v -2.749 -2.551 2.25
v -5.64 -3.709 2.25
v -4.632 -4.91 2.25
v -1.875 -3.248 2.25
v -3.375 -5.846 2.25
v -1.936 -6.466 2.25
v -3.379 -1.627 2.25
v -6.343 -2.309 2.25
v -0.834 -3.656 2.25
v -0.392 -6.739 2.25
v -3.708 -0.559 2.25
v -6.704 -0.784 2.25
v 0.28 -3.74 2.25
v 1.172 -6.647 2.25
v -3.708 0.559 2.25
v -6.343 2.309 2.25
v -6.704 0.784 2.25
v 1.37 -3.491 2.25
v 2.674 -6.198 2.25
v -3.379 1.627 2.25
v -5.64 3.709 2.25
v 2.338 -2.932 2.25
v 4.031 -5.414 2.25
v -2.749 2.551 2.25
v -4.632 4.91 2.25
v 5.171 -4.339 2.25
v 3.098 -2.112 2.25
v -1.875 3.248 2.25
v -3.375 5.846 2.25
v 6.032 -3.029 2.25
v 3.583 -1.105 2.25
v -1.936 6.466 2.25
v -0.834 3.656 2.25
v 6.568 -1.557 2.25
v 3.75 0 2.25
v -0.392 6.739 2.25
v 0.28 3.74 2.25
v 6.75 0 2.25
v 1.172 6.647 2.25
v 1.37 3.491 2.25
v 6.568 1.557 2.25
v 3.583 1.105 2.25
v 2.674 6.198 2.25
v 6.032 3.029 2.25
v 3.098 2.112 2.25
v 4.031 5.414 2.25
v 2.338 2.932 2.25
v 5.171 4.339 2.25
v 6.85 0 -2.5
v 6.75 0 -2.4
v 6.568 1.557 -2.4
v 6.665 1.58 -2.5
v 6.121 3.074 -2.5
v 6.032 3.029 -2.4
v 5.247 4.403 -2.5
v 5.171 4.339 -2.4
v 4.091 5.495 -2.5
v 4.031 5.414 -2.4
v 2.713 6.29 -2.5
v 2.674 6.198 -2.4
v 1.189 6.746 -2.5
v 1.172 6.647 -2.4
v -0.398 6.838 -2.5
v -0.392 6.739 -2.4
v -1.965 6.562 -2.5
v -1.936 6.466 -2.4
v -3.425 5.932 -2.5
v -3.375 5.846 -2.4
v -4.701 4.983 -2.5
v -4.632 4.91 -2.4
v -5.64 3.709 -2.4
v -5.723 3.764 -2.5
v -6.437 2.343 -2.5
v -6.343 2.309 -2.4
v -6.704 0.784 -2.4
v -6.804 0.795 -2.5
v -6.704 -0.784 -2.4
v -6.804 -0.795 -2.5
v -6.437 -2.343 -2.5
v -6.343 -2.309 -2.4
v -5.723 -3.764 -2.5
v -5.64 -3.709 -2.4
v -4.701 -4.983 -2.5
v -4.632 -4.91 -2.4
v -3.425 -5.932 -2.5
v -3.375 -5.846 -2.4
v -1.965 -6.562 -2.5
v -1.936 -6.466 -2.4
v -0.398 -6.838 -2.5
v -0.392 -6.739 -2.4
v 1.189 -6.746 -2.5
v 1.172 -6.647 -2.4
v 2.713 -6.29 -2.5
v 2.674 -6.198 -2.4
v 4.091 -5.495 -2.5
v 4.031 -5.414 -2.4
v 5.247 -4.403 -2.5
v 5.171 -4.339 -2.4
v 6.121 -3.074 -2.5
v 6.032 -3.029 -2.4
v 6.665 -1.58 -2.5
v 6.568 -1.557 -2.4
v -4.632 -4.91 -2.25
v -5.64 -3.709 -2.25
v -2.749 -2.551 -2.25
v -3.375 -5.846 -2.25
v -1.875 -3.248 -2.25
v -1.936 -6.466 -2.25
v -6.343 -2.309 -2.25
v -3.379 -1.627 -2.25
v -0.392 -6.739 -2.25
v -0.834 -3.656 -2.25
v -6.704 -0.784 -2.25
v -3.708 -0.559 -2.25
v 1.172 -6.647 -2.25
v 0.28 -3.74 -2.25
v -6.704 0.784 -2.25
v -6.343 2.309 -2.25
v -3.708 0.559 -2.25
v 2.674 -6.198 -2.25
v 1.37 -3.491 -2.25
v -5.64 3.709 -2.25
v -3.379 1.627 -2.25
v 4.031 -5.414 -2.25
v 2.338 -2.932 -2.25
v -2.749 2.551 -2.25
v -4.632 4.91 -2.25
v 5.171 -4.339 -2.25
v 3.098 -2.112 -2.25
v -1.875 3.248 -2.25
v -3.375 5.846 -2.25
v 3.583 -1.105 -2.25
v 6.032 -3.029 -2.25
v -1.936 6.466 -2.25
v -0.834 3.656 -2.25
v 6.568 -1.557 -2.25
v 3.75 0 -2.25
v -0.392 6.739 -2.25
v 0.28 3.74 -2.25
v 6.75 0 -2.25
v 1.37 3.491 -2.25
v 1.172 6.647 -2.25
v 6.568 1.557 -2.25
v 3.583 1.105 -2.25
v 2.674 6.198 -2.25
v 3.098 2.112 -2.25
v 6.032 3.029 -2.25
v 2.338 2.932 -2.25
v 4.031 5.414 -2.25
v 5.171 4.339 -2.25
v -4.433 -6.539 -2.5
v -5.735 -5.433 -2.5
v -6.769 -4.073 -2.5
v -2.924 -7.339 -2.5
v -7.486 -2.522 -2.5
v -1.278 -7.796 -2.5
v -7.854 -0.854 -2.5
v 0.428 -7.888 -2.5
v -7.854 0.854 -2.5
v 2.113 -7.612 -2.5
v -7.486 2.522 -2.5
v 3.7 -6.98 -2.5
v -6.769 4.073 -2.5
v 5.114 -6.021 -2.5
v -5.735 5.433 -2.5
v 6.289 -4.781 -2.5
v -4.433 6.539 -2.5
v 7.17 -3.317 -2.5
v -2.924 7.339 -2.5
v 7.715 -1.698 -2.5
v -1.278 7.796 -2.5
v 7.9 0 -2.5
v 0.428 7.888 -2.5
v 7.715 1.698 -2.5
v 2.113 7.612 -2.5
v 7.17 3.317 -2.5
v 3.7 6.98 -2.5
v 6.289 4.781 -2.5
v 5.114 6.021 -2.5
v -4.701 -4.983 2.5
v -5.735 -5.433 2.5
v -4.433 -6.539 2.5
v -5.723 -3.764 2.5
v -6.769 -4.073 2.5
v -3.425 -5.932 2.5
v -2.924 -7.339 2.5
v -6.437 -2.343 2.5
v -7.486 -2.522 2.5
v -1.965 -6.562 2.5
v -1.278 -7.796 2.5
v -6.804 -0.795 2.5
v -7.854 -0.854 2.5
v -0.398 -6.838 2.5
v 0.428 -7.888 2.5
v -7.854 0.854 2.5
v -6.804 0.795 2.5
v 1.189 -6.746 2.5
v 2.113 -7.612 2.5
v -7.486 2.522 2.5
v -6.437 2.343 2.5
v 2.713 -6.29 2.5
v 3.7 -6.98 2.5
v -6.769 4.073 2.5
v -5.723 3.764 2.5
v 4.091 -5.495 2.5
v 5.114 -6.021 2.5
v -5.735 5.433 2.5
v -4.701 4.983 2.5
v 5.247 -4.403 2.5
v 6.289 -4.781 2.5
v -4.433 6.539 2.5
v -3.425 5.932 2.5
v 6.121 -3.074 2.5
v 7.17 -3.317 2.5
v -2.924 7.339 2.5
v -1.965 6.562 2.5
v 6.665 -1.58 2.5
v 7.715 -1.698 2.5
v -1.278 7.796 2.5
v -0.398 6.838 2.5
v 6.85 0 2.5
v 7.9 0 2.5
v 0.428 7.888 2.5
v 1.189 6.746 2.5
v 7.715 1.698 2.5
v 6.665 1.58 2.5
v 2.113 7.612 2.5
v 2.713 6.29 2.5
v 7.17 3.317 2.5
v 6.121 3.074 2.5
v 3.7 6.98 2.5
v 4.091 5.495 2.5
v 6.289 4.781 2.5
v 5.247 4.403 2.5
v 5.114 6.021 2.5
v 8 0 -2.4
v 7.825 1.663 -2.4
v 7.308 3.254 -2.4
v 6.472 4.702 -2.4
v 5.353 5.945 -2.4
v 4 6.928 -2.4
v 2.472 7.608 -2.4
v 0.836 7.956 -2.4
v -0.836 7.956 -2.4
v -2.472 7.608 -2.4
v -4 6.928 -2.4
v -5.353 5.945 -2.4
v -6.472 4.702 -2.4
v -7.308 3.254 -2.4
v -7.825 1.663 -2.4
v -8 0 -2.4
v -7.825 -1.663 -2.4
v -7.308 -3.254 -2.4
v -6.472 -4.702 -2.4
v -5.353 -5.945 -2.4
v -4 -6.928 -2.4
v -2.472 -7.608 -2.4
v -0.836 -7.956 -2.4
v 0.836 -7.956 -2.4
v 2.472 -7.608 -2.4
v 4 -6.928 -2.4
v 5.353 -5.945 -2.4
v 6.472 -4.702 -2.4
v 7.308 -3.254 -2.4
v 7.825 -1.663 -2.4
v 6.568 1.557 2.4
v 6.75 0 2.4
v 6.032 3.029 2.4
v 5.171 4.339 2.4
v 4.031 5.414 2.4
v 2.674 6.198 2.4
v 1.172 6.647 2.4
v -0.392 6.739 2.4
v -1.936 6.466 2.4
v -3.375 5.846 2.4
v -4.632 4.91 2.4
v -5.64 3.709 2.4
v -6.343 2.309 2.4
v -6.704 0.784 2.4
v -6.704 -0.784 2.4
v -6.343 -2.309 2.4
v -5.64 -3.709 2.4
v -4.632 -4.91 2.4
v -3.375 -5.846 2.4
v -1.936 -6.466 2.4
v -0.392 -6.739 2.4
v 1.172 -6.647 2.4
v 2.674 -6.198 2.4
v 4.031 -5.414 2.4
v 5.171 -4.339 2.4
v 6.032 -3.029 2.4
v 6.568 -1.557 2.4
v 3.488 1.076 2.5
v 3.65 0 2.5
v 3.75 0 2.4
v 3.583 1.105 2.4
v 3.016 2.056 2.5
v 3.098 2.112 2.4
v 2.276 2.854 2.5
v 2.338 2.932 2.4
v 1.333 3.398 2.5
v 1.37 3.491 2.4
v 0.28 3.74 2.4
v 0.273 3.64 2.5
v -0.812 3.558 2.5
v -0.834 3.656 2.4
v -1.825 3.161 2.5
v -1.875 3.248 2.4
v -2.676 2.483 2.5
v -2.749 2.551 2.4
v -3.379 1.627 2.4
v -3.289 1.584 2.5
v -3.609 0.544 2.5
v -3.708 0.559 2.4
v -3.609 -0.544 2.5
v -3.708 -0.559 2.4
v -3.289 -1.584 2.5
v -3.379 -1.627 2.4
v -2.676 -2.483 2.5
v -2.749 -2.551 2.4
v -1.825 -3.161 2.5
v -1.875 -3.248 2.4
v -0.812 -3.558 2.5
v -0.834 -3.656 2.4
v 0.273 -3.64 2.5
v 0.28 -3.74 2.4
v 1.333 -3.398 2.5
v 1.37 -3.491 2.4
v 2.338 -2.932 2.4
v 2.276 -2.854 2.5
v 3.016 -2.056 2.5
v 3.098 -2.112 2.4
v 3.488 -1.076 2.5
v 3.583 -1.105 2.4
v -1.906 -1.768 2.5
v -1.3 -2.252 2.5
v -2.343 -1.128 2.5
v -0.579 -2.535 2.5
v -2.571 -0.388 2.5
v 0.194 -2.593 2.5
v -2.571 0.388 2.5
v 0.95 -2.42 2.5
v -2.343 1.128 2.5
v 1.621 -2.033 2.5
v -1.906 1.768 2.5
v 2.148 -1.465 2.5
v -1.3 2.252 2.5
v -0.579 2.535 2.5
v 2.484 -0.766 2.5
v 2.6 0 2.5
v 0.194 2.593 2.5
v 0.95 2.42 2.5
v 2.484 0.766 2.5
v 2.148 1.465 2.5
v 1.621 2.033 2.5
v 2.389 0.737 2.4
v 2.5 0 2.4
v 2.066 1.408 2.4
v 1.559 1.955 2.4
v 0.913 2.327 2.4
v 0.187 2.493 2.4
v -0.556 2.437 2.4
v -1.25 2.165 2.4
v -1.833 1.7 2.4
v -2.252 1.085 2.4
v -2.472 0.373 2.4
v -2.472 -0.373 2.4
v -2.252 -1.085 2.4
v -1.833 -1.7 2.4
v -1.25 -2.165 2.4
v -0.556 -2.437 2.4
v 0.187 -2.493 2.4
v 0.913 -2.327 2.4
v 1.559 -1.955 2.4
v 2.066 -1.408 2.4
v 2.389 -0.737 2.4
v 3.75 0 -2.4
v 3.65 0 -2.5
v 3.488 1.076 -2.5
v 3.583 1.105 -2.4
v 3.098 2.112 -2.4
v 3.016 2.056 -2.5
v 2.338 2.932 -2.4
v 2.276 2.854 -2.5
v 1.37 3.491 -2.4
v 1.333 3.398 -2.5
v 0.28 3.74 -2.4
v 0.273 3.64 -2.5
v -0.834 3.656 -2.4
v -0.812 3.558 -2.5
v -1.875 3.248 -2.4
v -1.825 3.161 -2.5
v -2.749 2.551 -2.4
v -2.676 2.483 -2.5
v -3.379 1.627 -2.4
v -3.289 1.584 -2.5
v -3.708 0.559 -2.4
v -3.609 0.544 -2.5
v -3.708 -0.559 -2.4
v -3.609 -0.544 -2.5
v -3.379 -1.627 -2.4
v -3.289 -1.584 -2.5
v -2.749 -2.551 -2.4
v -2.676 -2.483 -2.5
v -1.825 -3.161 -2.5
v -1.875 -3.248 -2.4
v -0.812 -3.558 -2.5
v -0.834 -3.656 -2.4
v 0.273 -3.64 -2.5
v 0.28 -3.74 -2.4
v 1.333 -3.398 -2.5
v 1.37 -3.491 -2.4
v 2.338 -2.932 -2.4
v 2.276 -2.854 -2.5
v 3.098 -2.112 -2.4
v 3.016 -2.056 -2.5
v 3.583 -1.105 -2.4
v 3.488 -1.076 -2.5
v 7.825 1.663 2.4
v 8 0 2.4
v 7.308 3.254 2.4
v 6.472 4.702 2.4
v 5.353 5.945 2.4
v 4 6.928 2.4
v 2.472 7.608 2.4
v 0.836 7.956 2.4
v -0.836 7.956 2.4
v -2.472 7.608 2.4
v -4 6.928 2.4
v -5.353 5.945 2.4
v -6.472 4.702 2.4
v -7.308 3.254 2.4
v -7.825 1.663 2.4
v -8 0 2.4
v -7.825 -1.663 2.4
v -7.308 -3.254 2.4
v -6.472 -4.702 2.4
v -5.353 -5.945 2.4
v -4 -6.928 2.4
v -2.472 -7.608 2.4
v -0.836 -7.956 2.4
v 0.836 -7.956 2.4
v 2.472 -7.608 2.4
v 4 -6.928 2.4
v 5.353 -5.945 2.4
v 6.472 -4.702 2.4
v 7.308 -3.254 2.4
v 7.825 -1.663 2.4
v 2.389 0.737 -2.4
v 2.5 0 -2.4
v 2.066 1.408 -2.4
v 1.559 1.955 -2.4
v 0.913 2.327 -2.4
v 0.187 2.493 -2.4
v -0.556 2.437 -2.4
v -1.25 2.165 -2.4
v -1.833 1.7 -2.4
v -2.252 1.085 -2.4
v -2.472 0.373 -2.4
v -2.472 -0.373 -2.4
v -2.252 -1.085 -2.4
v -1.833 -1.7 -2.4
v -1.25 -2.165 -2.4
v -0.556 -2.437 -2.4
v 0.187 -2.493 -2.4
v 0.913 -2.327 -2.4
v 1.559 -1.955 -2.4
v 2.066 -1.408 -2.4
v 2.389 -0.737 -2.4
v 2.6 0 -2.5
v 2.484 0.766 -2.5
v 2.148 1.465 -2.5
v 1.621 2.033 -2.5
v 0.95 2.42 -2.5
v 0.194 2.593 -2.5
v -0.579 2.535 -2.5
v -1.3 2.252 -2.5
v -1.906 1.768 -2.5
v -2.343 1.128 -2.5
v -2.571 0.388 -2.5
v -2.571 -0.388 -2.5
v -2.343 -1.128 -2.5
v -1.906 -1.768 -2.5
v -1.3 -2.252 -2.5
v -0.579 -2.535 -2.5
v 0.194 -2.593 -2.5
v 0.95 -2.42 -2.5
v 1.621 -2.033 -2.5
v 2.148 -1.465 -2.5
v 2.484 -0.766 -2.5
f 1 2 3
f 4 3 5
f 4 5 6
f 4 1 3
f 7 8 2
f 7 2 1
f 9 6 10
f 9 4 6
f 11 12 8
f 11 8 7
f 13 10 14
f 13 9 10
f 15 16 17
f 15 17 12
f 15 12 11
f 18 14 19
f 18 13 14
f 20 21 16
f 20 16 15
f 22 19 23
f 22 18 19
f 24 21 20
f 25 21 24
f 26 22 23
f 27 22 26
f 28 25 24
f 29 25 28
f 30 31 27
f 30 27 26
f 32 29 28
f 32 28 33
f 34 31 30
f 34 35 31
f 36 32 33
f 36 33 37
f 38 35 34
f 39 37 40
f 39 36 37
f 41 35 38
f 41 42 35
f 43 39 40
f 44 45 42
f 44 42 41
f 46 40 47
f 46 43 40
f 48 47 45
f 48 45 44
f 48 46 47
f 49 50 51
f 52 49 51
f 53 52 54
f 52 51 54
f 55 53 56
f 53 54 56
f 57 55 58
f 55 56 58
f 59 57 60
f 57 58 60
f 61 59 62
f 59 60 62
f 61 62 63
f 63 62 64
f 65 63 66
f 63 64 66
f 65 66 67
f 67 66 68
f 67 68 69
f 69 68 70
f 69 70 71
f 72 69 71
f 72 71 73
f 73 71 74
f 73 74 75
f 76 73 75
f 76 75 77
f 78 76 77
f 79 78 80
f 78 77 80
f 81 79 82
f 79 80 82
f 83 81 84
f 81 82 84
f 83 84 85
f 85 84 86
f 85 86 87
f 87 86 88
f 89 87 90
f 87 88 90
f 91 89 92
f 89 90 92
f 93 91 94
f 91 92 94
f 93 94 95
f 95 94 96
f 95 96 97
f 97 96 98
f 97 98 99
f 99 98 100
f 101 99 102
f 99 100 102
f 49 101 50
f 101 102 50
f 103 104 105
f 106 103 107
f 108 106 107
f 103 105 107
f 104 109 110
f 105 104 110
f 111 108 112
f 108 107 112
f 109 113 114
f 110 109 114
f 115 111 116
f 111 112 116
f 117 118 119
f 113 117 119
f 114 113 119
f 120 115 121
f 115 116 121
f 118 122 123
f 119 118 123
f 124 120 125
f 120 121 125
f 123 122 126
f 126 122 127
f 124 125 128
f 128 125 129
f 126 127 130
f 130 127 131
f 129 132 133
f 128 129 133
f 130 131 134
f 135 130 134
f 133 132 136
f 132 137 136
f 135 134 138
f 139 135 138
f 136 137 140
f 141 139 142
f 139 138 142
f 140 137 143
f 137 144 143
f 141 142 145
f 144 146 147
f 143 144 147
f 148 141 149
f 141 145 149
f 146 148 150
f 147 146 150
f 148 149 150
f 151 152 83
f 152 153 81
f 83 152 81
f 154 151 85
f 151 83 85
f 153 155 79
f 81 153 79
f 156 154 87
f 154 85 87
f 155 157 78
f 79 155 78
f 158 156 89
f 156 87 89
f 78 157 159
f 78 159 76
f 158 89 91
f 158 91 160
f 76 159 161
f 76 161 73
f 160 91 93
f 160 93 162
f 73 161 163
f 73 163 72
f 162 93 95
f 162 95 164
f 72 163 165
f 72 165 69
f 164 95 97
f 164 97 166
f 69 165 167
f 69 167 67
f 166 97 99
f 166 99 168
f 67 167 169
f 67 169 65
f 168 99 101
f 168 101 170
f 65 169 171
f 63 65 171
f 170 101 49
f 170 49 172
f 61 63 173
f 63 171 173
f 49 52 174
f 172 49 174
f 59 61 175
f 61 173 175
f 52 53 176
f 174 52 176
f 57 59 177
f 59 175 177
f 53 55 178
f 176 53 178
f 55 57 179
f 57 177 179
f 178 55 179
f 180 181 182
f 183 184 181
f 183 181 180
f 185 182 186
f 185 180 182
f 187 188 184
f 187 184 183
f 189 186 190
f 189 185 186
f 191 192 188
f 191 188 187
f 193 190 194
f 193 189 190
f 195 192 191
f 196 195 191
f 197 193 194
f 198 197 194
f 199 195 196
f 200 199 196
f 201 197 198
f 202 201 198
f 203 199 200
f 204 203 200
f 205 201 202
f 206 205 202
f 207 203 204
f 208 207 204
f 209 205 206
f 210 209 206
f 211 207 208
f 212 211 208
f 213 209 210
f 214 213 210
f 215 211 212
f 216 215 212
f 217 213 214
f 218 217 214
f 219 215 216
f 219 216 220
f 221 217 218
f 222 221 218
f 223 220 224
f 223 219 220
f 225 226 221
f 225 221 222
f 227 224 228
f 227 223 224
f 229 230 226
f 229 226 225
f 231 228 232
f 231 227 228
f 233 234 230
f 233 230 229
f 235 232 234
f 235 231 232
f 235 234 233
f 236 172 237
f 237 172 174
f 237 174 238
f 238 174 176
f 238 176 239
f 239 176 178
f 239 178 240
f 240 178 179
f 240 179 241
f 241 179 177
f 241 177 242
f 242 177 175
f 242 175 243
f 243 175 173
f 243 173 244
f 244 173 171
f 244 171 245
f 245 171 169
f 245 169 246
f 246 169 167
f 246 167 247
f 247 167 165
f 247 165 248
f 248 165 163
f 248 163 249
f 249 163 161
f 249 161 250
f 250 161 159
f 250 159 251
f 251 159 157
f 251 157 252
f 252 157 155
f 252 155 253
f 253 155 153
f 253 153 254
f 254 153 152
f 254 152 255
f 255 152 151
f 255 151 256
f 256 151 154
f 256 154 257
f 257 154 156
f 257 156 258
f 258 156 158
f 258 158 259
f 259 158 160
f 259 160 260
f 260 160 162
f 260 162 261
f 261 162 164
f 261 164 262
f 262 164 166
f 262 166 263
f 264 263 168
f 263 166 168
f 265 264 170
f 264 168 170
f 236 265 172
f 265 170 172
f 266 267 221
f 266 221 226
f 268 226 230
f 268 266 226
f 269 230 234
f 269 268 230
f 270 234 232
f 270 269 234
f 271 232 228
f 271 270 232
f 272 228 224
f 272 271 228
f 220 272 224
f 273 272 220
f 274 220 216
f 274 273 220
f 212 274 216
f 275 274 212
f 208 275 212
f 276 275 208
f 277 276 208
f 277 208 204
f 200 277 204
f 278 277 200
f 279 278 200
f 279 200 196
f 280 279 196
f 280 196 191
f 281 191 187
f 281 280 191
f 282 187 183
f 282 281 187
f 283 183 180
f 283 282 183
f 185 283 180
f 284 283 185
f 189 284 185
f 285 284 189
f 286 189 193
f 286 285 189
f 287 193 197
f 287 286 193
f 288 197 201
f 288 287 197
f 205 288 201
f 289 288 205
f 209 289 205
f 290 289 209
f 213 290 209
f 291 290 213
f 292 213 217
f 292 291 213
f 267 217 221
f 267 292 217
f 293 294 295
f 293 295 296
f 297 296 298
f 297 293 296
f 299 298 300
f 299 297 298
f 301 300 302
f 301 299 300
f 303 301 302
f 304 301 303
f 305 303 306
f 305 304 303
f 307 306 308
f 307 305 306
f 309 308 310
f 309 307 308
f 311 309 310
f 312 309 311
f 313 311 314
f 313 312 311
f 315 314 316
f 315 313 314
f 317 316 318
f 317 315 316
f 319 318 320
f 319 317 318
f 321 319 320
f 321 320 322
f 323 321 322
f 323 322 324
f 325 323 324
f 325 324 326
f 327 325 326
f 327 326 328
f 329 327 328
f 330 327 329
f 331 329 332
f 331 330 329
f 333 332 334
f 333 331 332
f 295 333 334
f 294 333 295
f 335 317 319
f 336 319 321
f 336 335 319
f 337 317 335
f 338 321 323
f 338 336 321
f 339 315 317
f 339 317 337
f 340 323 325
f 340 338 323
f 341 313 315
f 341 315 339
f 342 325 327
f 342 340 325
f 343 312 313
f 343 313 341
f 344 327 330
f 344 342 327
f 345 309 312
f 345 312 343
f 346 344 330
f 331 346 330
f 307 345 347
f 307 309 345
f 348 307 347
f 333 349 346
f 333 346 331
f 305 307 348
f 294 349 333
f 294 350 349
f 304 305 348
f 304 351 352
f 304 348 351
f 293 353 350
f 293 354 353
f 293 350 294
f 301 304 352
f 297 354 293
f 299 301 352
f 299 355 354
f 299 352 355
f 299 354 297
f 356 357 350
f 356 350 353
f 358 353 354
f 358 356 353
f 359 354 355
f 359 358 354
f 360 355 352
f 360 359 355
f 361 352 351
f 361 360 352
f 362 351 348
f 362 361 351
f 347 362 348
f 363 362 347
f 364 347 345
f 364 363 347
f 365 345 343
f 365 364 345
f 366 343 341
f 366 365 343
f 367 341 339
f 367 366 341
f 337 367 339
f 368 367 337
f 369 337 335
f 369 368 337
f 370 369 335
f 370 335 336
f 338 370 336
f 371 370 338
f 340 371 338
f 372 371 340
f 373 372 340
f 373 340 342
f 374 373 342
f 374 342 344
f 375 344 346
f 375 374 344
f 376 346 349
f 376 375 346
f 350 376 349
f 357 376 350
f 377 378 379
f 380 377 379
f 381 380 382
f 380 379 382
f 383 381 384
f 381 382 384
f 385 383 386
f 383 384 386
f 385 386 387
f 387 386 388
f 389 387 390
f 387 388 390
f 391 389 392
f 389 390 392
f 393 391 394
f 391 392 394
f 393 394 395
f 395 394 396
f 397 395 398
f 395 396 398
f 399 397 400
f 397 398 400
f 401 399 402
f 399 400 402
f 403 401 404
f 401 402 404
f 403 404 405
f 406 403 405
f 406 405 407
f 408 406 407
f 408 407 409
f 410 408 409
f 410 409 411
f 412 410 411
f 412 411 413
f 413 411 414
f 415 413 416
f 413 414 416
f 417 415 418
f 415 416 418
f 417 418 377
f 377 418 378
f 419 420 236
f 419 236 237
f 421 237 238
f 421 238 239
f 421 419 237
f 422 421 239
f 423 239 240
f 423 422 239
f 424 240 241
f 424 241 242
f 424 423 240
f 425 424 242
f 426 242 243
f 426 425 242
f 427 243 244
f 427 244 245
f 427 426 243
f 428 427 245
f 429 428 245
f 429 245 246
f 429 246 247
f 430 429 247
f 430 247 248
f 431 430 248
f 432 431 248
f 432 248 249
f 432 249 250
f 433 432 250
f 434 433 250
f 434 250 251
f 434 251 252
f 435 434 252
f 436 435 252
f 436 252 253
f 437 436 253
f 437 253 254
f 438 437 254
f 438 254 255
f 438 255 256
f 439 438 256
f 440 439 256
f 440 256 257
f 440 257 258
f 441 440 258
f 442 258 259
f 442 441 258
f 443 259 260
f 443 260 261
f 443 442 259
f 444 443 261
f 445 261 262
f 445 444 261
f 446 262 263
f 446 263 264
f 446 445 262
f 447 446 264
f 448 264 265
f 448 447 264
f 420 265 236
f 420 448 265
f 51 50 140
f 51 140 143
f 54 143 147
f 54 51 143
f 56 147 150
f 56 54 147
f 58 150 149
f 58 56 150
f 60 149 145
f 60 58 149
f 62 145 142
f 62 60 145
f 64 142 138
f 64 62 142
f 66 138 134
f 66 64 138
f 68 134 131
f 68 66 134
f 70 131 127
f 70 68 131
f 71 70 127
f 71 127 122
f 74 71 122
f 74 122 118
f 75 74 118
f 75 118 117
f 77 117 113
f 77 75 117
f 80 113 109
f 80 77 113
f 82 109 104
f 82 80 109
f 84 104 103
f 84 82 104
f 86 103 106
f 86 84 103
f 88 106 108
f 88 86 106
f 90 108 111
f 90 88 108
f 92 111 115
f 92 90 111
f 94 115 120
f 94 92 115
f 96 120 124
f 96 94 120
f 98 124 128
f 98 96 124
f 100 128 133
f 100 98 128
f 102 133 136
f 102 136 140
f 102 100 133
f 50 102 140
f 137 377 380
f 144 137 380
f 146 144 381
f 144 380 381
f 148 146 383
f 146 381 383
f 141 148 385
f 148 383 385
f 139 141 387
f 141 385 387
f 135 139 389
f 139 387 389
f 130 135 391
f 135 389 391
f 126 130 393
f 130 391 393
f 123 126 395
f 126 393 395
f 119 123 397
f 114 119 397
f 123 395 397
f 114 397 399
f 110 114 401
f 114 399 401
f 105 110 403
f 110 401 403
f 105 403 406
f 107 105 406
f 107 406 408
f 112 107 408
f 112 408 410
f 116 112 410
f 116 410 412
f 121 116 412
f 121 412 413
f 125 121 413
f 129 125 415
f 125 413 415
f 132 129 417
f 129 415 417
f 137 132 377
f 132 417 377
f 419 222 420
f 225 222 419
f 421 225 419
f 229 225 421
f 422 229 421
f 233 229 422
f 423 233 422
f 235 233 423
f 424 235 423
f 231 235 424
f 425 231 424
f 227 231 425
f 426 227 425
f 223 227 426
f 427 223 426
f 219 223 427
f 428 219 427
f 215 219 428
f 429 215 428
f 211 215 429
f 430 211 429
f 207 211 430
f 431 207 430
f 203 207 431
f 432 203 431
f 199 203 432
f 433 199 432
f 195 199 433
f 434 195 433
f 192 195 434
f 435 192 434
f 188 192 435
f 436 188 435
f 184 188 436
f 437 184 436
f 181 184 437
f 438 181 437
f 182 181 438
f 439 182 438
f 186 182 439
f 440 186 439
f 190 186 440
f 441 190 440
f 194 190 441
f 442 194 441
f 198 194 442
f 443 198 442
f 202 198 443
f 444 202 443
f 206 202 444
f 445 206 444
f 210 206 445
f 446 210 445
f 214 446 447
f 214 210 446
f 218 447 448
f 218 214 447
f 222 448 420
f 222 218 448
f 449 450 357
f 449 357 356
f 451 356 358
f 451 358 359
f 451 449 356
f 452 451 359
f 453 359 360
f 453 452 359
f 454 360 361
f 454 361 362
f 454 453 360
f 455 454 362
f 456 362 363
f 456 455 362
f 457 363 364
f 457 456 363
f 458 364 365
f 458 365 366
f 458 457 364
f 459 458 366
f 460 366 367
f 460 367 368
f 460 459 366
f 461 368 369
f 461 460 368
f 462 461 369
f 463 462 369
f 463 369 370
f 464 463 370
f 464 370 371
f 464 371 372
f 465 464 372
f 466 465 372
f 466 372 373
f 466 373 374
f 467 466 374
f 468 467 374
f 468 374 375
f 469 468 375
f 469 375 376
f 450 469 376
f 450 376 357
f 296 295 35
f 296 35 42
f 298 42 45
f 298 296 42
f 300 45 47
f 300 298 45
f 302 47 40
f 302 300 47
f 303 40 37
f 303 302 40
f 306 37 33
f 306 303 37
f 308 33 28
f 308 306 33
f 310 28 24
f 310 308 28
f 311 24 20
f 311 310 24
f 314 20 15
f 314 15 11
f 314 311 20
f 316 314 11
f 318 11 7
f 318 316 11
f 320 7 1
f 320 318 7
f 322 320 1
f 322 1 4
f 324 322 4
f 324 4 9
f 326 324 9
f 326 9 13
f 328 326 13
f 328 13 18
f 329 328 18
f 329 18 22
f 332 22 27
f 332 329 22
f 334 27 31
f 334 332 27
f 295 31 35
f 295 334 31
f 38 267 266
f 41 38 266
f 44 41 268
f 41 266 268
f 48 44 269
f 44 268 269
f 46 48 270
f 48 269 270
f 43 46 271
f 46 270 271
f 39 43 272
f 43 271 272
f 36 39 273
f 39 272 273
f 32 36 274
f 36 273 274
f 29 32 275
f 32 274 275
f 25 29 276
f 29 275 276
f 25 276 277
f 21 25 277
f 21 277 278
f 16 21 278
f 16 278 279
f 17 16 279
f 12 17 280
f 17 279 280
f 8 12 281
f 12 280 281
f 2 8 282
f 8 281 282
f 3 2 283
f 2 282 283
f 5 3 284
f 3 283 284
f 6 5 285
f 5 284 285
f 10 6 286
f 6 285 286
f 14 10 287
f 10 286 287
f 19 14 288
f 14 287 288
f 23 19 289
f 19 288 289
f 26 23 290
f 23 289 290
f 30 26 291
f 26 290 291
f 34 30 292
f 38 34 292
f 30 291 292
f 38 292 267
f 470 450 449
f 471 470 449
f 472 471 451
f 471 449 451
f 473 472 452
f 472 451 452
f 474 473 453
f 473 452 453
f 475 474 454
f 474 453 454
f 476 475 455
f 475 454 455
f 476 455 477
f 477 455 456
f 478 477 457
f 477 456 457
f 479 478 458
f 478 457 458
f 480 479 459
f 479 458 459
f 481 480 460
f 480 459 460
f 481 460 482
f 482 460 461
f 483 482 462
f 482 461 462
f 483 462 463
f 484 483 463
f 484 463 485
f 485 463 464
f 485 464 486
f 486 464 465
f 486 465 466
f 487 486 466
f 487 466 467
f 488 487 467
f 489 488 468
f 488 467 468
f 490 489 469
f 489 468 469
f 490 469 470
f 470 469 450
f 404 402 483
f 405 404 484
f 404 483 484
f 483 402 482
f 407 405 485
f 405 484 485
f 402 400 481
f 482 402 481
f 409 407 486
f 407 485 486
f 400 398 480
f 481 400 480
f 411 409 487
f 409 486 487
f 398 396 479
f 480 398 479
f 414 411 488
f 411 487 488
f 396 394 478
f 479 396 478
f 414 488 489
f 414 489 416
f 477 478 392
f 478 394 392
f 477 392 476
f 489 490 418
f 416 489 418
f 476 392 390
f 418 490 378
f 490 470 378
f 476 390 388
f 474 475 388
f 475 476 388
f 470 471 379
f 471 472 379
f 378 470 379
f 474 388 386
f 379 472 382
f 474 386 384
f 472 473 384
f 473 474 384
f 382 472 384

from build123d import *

# Parameters (mm, degrees)
SKETCH1_R                = 8
SKETCH1_R_2              = 2.5
BOSS_EXTRUDE1_DEPTH      = 2.5
BOSS_EXTRUDE1_DEPTH_BACK = 2.5
CUT_EXTRUDE1_START       = -2.5
SKETCH2_R                = 6.75
SKETCH2_R_2              = 3.75
CUT_EXTRUDE1_DEPTH       = 0.25
CUT_EXTRUDE2_START       = 2.5
SKETCH2_2_R              = 6.75
SKETCH2_2_R_2            = 3.75
CUT_EXTRUDE2_DEPTH       = 0.25
CHAMFER1_SIZE            = 0.1


with BuildPart() as part:
    # Sketch1 → Boss-Extrude1 (new body, two sides)
    with BuildSketch(Plane.XY) as boss_extrude1_sk:
        Circle(SKETCH1_R)
        Circle(SKETCH1_R_2, mode=Mode.SUBTRACT)
    extrude(amount=BOSS_EXTRUDE1_DEPTH)
    extrude(boss_extrude1_sk.sketch, amount=-BOSS_EXTRUDE1_DEPTH_BACK)

    # Sketch2 → Cut-Extrude1 (cut)
    with BuildSketch(Plane.XY.offset(CUT_EXTRUDE1_START)):
        Circle(SKETCH2_R)
        Circle(SKETCH2_R_2, mode=Mode.SUBTRACT)
    extrude(amount=CUT_EXTRUDE1_DEPTH, mode=Mode.SUBTRACT)

    # Sketch2_2 → Cut-Extrude2 (cut)
    with BuildSketch(Plane.XY.offset(CUT_EXTRUDE2_START)):
        Circle(SKETCH2_2_R)
        Circle(SKETCH2_2_R_2, mode=Mode.SUBTRACT)
    extrude(amount=-CUT_EXTRUDE2_DEPTH, mode=Mode.SUBTRACT)

    # Chamfer1
    chamfer1_edges = [part.edges().sort_by_distance(p)[0] for p in [
        (-3.75, 0, -2.5),
        (-6.75, 0, -2.5),
        (-6.75, 0, 2.5),
        (-3.75, 0, 2.5),
        (-8, 0, -2.5),
        (-2.5, 0, -2.5),
        (-8, 0, 2.5),
        (-2.5, 0, 2.5),
    ]]
    chamfer(chamfer1_edges, length=CHAMFER1_SIZE)


solid = part.part
